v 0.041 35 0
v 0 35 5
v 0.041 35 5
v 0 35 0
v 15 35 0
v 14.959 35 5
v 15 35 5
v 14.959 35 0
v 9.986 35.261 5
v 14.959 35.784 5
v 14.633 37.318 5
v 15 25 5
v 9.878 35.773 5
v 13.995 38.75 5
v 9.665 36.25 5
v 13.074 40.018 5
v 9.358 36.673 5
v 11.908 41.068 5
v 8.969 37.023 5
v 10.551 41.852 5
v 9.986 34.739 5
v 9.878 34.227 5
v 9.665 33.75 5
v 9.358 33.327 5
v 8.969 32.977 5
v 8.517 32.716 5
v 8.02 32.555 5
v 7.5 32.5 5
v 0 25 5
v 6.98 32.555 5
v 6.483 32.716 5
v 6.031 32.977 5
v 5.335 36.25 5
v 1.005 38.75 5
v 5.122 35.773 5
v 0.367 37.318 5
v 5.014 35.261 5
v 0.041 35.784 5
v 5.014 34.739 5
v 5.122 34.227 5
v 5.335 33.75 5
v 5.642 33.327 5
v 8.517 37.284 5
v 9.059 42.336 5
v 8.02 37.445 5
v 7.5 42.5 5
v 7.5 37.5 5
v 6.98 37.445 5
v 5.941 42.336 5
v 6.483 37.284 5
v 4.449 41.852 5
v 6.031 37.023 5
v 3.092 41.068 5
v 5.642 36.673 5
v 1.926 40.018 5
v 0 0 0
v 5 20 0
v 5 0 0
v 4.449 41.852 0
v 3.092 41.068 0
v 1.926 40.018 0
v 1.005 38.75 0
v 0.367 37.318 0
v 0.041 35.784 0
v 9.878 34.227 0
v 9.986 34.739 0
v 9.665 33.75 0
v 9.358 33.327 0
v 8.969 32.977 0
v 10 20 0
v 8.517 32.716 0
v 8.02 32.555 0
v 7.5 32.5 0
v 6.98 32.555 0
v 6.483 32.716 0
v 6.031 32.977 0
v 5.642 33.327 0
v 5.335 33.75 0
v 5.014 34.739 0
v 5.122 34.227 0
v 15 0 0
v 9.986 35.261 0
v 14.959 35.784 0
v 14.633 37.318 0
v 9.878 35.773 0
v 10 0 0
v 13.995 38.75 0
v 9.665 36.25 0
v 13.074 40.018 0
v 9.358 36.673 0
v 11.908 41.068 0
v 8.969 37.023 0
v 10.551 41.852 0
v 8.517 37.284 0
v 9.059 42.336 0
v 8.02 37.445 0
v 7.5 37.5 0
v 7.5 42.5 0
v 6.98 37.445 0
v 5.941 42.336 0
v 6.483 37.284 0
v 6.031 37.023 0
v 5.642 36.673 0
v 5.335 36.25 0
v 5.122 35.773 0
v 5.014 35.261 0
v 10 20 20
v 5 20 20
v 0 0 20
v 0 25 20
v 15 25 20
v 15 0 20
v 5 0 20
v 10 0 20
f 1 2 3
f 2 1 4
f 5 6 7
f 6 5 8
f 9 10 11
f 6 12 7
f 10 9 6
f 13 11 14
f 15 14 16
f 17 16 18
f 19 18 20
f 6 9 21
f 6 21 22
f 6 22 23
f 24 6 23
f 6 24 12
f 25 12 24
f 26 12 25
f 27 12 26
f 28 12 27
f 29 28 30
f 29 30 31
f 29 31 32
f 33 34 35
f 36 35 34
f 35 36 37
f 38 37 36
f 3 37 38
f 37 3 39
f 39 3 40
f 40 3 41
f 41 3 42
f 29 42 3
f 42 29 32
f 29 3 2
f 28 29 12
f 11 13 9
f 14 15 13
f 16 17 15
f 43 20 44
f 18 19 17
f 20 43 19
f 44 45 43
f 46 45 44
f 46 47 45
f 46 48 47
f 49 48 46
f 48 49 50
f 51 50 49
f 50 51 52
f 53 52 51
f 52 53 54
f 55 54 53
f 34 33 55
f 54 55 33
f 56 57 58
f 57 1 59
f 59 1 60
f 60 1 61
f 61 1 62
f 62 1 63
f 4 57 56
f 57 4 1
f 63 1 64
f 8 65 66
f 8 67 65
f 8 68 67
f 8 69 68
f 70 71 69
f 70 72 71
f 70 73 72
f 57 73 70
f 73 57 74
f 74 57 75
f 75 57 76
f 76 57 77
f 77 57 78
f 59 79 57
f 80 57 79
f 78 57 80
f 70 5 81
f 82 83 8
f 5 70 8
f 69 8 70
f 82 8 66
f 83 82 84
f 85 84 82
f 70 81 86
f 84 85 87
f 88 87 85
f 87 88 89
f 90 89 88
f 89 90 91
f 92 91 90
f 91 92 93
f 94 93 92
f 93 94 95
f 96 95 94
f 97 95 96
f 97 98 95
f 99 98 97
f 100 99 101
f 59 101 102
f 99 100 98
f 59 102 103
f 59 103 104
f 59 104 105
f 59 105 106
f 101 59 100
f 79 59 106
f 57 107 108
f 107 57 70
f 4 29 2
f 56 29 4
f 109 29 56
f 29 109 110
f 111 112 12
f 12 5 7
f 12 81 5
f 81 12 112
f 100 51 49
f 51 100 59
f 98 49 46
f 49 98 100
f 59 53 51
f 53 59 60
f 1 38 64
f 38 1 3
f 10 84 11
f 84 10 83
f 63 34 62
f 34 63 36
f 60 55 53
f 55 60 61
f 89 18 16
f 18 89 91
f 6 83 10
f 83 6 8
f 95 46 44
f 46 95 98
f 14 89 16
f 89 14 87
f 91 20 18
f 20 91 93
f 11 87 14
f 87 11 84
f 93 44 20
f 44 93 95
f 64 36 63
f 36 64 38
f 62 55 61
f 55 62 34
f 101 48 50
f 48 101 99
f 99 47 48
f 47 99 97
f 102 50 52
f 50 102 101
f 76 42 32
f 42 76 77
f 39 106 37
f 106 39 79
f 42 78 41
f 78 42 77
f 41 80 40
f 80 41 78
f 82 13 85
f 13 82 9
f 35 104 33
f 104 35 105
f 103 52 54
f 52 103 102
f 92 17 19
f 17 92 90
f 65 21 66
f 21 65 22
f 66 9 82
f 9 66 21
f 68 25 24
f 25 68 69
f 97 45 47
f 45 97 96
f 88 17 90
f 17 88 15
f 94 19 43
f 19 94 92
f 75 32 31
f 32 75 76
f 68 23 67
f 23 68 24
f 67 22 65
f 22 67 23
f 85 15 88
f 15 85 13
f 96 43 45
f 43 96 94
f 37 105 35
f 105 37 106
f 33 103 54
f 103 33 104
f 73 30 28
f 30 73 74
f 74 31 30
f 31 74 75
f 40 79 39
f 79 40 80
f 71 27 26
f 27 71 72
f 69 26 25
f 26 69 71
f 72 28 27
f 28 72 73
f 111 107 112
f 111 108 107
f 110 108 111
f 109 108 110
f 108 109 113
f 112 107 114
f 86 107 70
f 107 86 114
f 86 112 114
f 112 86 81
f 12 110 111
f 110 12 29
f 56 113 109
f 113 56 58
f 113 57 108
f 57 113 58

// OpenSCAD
// Author: Charlie Snyder
// Twitter Handle: @mjrsnyder

$fn=30;

glass_thickness=5;

module screw_mount(screw_size, base_thickness, mount_width, mount_depth) {
    difference(){
        union(){
            cube([mount_depth,mount_width,base_thickness]);
            translate([mount_depth,mount_width/2,0]){
                cylinder(h=base_thickness, d=mount_width);
            }
        }
        translate([mount_depth,mount_width/2,0]){
            cylinder(h=base_thickness, d=screw_size);
        }
        
    }
}

module tank_clip(glass_thickness){
    back_thickness=5;
    height=20;
    width=20;
    screw_size=5;
    screw_base_thickness=5;
    screw_mount_width=(back_thickness*2)+glass_thickness;
    screw_mount_depth=15;
    linear_extrude(height=width){
        polygon(points=[
            [0,0],
            [back_thickness,0],
            [back_thickness,height],
            [back_thickness+glass_thickness,height],
            [back_thickness+glass_thickness,0],
            [(back_thickness*2)+glass_thickness,0],
            [(back_thickness*2)+glass_thickness,height+back_thickness],
            [0,height+back_thickness],
            [0,0]
        ]);
    }
    
    translate([screw_mount_width,screw_mount_width+(screw_size),0]){
        rotate(a=[0,0,90]){
            screw_mount(screw_size, screw_base_thickness, screw_mount_width, screw_mount_depth);
        }
    }
}




tank_clip(glass_thickness);
